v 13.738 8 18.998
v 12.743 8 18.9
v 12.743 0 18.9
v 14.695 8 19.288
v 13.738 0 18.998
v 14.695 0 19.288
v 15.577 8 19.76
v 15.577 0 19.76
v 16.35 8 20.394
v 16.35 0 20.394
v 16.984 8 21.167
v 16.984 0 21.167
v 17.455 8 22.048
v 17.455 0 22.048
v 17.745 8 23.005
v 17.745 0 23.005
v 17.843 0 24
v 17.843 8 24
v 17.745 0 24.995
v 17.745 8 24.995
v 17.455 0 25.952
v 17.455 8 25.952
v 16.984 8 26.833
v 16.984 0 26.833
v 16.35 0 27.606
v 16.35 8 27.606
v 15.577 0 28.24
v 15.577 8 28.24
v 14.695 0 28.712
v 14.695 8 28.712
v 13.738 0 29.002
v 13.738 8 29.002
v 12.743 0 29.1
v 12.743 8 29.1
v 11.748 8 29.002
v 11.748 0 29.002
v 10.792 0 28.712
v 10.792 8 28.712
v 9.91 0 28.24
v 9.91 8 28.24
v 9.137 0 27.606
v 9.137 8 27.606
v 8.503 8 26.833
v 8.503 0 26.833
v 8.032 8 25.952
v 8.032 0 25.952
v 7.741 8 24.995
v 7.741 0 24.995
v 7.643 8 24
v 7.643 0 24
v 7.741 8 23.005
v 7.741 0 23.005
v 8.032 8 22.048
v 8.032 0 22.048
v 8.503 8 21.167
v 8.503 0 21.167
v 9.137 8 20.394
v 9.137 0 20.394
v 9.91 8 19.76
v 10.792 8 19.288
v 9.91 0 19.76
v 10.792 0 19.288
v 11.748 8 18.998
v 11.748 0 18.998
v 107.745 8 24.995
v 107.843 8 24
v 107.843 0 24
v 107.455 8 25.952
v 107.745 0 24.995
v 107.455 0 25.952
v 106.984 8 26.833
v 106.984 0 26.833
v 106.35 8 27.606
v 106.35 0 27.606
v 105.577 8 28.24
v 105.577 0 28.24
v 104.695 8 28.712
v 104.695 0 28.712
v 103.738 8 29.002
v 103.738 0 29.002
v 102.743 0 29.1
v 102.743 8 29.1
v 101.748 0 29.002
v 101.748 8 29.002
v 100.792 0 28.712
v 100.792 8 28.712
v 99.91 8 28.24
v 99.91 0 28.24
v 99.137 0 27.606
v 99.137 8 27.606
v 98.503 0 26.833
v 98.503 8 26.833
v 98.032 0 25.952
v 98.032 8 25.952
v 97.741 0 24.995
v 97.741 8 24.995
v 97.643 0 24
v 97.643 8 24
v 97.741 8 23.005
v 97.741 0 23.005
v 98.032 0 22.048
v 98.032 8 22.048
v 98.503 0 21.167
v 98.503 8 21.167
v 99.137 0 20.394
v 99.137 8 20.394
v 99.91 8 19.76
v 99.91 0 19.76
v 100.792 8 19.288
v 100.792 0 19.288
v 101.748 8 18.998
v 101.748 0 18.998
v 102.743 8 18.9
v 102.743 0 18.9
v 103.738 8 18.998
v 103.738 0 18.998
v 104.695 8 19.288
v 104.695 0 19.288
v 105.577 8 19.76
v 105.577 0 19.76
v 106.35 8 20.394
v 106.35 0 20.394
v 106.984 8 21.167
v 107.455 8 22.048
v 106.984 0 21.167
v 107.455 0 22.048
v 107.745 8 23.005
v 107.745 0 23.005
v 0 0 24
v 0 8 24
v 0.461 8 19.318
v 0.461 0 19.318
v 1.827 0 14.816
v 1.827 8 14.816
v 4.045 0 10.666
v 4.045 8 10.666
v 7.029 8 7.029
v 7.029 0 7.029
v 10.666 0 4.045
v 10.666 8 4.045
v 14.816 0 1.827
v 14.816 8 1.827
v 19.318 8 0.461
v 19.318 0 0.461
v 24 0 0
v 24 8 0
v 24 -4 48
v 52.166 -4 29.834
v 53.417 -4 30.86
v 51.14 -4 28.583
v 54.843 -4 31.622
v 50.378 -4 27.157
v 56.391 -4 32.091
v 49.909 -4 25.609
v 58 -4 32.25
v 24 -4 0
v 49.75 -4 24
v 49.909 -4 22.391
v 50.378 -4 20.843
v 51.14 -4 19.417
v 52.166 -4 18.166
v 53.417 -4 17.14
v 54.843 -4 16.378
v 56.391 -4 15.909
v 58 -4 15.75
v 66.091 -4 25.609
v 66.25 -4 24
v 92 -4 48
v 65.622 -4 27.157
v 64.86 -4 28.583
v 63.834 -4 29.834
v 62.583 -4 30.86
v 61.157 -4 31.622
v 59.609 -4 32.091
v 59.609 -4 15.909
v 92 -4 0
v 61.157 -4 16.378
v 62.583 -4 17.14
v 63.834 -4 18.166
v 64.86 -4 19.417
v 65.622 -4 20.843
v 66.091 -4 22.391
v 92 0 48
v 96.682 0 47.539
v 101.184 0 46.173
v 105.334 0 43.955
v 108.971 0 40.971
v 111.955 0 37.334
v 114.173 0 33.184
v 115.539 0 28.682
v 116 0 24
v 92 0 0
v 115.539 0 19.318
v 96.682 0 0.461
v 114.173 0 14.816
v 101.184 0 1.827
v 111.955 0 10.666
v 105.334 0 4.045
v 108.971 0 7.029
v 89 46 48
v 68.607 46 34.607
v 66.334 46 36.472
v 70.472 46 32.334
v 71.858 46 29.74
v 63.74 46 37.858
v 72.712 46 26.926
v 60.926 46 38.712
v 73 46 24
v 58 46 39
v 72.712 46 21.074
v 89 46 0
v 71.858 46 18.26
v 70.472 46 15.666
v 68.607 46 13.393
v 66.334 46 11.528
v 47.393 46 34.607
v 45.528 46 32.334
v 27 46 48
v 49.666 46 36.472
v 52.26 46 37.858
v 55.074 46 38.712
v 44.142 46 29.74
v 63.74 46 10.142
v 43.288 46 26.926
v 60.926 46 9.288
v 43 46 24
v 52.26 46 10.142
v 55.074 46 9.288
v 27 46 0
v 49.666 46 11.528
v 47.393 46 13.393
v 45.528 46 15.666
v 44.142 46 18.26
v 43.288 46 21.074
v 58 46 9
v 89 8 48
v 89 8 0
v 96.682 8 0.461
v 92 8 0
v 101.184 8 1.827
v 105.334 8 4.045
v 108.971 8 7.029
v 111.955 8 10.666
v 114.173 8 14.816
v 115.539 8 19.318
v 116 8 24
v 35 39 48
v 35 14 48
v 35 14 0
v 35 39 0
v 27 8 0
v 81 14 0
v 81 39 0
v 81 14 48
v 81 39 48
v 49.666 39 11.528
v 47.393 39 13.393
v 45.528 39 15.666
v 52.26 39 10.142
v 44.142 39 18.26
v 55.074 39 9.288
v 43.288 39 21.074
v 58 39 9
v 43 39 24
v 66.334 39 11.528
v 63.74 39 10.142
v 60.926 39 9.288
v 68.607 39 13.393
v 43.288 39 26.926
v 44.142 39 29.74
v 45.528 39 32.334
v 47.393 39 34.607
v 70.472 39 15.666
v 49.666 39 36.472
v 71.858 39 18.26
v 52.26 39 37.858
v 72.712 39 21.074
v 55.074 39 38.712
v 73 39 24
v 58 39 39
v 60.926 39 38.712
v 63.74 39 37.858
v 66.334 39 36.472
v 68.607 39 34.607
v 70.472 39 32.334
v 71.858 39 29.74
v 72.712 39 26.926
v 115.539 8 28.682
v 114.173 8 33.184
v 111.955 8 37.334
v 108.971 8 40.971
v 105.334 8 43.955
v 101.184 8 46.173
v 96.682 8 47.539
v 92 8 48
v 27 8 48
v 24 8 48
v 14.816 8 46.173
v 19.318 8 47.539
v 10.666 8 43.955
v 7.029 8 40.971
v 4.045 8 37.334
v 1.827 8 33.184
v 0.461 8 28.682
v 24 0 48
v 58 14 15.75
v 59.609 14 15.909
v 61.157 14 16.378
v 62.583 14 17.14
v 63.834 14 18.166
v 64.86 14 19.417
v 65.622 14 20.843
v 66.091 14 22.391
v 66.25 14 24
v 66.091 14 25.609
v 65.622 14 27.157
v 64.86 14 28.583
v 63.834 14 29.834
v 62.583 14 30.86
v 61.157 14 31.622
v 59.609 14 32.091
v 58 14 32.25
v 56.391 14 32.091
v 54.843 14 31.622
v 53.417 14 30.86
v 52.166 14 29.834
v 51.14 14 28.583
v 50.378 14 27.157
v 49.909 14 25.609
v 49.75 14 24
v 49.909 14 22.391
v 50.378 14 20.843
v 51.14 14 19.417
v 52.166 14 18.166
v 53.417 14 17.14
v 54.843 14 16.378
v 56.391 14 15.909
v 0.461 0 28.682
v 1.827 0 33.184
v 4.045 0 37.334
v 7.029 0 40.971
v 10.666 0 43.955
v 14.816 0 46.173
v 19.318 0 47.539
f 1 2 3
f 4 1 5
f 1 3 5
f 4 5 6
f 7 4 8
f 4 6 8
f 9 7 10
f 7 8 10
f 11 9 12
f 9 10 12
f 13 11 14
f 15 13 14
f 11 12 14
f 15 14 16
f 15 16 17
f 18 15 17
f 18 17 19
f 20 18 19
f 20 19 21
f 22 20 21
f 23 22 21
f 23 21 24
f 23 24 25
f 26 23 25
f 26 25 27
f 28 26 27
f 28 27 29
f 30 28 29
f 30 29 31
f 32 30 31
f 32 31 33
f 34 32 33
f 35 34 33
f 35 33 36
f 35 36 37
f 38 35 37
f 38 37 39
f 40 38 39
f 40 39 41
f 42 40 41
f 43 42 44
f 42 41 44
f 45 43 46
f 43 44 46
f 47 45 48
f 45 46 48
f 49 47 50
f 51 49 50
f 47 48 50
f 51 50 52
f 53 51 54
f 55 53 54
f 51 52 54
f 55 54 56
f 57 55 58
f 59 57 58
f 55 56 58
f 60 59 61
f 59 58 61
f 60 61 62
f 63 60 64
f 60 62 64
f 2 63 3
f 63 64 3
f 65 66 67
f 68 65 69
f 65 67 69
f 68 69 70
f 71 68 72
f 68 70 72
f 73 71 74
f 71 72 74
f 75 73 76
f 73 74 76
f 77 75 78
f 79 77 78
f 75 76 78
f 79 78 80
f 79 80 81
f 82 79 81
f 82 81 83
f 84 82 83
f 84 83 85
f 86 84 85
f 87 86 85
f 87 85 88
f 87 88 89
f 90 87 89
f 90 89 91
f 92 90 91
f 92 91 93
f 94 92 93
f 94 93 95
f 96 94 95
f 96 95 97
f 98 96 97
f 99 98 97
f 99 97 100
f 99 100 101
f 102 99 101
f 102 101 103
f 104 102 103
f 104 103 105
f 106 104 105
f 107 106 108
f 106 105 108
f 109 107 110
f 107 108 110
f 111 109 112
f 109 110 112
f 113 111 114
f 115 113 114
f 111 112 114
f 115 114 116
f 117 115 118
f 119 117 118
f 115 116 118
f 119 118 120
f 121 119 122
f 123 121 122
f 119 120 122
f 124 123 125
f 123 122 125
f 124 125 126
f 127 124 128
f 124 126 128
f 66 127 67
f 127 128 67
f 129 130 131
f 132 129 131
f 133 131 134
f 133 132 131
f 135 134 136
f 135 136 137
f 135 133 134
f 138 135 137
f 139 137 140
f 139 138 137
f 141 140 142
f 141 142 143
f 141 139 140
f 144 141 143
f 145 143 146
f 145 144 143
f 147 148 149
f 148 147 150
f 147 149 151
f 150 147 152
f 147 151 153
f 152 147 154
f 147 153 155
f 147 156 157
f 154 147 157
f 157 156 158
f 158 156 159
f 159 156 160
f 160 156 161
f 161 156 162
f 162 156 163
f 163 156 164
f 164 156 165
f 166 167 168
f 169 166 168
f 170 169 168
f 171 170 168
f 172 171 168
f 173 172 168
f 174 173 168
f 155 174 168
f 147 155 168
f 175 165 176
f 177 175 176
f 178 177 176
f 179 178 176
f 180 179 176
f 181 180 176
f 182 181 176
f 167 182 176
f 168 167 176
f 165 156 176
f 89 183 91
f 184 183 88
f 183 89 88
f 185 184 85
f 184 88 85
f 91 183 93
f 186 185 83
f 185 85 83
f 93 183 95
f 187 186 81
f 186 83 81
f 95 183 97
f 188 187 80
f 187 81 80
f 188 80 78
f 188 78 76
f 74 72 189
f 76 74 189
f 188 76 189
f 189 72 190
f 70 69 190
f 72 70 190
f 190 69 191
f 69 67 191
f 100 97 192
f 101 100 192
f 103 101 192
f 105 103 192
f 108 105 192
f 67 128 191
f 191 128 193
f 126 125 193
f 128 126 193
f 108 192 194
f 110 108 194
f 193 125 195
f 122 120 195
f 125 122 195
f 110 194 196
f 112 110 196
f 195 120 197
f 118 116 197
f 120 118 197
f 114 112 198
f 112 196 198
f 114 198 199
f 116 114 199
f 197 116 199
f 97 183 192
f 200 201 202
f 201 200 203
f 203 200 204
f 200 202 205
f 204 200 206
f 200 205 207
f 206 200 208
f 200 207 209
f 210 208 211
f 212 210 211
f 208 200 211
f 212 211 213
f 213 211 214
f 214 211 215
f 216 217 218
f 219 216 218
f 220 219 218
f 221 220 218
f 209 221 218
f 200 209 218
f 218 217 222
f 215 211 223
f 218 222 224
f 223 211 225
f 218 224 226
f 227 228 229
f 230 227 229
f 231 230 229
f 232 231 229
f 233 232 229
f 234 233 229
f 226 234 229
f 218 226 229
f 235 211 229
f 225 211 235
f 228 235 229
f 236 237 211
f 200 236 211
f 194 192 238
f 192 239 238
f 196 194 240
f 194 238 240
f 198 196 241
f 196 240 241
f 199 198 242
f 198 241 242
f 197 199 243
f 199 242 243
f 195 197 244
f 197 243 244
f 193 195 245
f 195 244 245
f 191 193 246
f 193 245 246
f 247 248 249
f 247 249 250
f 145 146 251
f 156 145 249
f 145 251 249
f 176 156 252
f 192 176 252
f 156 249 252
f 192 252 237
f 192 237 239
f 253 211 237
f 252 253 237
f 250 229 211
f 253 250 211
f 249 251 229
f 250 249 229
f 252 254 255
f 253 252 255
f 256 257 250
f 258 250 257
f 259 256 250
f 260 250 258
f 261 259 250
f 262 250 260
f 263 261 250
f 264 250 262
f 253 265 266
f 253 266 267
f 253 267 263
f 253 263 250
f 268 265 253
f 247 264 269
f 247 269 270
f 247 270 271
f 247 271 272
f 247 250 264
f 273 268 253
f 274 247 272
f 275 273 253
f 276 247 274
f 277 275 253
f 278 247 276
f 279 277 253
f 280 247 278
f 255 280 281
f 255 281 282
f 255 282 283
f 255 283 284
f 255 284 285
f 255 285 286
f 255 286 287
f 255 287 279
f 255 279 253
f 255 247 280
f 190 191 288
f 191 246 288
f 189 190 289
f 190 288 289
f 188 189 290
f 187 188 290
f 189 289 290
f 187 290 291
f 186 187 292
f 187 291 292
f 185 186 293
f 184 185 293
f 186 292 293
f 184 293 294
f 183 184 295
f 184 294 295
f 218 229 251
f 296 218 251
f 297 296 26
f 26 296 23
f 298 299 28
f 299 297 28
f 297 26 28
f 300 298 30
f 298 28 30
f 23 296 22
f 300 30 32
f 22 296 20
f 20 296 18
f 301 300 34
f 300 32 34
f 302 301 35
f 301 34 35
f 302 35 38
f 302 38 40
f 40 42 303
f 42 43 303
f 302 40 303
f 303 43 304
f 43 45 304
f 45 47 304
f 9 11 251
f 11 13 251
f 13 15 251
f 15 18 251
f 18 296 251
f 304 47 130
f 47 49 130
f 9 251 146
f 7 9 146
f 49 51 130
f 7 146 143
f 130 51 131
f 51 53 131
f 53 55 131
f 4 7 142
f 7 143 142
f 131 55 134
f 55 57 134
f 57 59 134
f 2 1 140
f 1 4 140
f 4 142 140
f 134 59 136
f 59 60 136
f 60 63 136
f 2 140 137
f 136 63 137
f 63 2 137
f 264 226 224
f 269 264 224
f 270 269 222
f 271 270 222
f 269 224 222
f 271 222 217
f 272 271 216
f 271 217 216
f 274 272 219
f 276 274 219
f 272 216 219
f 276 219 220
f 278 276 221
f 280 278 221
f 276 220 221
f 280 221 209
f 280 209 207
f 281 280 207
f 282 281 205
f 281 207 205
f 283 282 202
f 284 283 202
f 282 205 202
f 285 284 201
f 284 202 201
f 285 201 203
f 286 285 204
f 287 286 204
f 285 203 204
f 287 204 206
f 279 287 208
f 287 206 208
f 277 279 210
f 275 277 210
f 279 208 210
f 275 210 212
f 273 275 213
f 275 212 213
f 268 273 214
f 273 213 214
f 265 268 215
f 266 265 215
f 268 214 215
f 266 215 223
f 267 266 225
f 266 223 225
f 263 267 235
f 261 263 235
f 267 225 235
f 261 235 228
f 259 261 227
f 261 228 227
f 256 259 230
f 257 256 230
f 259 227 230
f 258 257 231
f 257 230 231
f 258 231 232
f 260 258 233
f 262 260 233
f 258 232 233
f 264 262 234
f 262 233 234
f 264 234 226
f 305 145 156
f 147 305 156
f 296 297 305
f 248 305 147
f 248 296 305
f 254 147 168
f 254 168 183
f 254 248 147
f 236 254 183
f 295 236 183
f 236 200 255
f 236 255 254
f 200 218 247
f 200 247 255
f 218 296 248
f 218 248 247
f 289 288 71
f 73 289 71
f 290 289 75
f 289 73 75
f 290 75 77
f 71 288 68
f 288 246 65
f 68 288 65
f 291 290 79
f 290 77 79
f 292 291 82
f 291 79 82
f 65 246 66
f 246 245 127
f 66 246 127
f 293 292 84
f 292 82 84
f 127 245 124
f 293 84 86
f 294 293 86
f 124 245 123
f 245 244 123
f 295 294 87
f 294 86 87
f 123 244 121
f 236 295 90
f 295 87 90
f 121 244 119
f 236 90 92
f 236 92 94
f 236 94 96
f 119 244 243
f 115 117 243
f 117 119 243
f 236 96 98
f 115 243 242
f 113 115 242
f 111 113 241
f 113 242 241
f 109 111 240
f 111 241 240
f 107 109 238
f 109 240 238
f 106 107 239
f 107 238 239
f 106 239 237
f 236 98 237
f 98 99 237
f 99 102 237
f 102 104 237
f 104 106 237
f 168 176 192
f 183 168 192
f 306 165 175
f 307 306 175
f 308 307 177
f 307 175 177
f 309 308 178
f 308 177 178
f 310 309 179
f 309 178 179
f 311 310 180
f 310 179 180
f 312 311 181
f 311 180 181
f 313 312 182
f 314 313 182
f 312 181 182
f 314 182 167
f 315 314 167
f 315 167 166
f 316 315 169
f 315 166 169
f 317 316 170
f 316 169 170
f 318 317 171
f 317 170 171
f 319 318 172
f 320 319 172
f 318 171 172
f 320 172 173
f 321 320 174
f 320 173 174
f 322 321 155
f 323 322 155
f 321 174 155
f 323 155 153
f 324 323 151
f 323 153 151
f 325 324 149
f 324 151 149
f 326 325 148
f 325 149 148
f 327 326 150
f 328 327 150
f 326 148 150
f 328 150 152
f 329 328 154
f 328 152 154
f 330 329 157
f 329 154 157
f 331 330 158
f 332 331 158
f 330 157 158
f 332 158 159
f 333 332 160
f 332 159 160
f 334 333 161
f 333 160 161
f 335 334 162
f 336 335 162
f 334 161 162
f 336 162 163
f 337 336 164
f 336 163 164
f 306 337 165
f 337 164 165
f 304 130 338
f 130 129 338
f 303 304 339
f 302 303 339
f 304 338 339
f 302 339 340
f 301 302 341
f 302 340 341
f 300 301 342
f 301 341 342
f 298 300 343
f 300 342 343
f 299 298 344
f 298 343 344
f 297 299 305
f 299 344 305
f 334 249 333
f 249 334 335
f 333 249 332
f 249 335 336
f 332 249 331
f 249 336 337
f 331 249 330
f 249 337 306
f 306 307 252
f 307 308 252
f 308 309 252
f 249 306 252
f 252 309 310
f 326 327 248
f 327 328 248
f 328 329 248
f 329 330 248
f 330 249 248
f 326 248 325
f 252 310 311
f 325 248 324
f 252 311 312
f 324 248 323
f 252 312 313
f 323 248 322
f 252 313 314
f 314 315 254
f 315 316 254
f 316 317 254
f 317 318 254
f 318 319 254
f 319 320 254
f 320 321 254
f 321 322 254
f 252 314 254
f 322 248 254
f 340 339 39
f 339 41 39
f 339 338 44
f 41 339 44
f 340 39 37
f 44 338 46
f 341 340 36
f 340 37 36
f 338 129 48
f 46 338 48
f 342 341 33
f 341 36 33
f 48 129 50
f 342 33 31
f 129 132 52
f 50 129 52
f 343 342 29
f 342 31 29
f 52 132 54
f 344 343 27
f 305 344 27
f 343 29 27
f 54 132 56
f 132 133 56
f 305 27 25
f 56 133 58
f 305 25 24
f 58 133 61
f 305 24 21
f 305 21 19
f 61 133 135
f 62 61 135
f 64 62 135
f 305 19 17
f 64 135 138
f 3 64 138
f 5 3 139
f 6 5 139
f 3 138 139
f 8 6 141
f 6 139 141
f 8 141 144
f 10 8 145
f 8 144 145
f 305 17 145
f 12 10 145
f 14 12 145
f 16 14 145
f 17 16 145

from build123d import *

# Parameters (mm, degrees)
EXTRUDE_1_DEPTH     = 48
FILLET_1_R          = 24
FILLET_2_R          = 24
FILLET_3_R          = 24
FILLET_4_R          = 24
SKETCH_8_W          = 46
SKETCH_8_H          = 25
CUT_EXTRUDE_2_DEPTH = 134.701159307
SKETCH_9_R          = 5.1
CUT_EXTRUDE_3_DEPTH = 48
SKETCH_11_R         = 8.25
CUT_EXTRUDE_4_DEPTH = 18
SKETCH_12_R         = 15
CUT_EXTRUDE_5_DEPTH = 7


with BuildPart() as part:
    # Эскиз1 → Бобышка-Вытянуть1 (new body)
    with BuildSketch(Plane.XY):
        Polygon((0, 0), (24, 0), (24, -4), (92, -4), (92, 0), (116, 0), (116, 8), (89, 8), (89, 46), (27, 46), (27, 8), (0, 8), align=None)
    extrude(amount=EXTRUDE_1_DEPTH)

    # Скругление1
    fillet_1_edges = [part.edges().sort_by_distance(p)[0] for p in [
        (0, 4, 48),
    ]]
    fillet(fillet_1_edges, radius=FILLET_1_R)

    # Скругление2
    fillet_2_edges = [part.edges().sort_by_distance(p)[0] for p in [
        (0, 4, 0),
    ]]
    fillet(fillet_2_edges, radius=FILLET_2_R - 0.0001)  # a hair under: the kernel refuses the full size

    # Скругление3
    fillet_3_edges = [part.edges().sort_by_distance(p)[0] for p in [
        (116, 4, 0),
    ]]
    fillet(fillet_3_edges, radius=FILLET_3_R)

    # Скругление4
    fillet_4_edges = [part.edges().sort_by_distance(p)[0] for p in [
        (116, 4, 48),
    ]]
    fillet(fillet_4_edges, radius=FILLET_4_R - 0.0001)  # a hair under: the kernel refuses the full size

    # Эскиз8 → Вырез-Вытянуть2 (cut, through all)
    with BuildSketch(Plane.XY.offset(48)):
        with Locations((58, 26.5)):
            Rectangle(SKETCH_8_W, SKETCH_8_H)
    extrude(amount=-CUT_EXTRUDE_2_DEPTH, mode=Mode.SUBTRACT)

    # Эскиз9 → Вырез-Вытянуть3 (cut)
    with BuildSketch(Plane.XZ.offset(4)):
        with Locations(Location((12.743315918, 24, 0), (0, 0, 270))):
            Circle(SKETCH_9_R)
        with Locations((102.743315918, 24)):
            Circle(SKETCH_9_R)
    extrude(amount=-CUT_EXTRUDE_3_DEPTH, mode=Mode.SUBTRACT)

    # Эскиз11 → Вырез-Вытянуть4 (cut)
    with BuildSketch(Plane.XZ.offset(4)):
        with Locations(Location((58, 24, 0), (0, 0, 270))):
            Circle(SKETCH_11_R)
    extrude(amount=-CUT_EXTRUDE_4_DEPTH, mode=Mode.SUBTRACT)

    # Эскиз12 → Вырез-Вытянуть5 (cut)
    with BuildSketch(Plane(origin=(0, 46, 0), x_dir=(1, 0, 0), z_dir=(0, 1, 0))):
        with Locations(Location((58, -24, 0), (0, 0, 180))):
            Circle(SKETCH_12_R)
    extrude(amount=-CUT_EXTRUDE_5_DEPTH, mode=Mode.SUBTRACT)


solid = part.part
